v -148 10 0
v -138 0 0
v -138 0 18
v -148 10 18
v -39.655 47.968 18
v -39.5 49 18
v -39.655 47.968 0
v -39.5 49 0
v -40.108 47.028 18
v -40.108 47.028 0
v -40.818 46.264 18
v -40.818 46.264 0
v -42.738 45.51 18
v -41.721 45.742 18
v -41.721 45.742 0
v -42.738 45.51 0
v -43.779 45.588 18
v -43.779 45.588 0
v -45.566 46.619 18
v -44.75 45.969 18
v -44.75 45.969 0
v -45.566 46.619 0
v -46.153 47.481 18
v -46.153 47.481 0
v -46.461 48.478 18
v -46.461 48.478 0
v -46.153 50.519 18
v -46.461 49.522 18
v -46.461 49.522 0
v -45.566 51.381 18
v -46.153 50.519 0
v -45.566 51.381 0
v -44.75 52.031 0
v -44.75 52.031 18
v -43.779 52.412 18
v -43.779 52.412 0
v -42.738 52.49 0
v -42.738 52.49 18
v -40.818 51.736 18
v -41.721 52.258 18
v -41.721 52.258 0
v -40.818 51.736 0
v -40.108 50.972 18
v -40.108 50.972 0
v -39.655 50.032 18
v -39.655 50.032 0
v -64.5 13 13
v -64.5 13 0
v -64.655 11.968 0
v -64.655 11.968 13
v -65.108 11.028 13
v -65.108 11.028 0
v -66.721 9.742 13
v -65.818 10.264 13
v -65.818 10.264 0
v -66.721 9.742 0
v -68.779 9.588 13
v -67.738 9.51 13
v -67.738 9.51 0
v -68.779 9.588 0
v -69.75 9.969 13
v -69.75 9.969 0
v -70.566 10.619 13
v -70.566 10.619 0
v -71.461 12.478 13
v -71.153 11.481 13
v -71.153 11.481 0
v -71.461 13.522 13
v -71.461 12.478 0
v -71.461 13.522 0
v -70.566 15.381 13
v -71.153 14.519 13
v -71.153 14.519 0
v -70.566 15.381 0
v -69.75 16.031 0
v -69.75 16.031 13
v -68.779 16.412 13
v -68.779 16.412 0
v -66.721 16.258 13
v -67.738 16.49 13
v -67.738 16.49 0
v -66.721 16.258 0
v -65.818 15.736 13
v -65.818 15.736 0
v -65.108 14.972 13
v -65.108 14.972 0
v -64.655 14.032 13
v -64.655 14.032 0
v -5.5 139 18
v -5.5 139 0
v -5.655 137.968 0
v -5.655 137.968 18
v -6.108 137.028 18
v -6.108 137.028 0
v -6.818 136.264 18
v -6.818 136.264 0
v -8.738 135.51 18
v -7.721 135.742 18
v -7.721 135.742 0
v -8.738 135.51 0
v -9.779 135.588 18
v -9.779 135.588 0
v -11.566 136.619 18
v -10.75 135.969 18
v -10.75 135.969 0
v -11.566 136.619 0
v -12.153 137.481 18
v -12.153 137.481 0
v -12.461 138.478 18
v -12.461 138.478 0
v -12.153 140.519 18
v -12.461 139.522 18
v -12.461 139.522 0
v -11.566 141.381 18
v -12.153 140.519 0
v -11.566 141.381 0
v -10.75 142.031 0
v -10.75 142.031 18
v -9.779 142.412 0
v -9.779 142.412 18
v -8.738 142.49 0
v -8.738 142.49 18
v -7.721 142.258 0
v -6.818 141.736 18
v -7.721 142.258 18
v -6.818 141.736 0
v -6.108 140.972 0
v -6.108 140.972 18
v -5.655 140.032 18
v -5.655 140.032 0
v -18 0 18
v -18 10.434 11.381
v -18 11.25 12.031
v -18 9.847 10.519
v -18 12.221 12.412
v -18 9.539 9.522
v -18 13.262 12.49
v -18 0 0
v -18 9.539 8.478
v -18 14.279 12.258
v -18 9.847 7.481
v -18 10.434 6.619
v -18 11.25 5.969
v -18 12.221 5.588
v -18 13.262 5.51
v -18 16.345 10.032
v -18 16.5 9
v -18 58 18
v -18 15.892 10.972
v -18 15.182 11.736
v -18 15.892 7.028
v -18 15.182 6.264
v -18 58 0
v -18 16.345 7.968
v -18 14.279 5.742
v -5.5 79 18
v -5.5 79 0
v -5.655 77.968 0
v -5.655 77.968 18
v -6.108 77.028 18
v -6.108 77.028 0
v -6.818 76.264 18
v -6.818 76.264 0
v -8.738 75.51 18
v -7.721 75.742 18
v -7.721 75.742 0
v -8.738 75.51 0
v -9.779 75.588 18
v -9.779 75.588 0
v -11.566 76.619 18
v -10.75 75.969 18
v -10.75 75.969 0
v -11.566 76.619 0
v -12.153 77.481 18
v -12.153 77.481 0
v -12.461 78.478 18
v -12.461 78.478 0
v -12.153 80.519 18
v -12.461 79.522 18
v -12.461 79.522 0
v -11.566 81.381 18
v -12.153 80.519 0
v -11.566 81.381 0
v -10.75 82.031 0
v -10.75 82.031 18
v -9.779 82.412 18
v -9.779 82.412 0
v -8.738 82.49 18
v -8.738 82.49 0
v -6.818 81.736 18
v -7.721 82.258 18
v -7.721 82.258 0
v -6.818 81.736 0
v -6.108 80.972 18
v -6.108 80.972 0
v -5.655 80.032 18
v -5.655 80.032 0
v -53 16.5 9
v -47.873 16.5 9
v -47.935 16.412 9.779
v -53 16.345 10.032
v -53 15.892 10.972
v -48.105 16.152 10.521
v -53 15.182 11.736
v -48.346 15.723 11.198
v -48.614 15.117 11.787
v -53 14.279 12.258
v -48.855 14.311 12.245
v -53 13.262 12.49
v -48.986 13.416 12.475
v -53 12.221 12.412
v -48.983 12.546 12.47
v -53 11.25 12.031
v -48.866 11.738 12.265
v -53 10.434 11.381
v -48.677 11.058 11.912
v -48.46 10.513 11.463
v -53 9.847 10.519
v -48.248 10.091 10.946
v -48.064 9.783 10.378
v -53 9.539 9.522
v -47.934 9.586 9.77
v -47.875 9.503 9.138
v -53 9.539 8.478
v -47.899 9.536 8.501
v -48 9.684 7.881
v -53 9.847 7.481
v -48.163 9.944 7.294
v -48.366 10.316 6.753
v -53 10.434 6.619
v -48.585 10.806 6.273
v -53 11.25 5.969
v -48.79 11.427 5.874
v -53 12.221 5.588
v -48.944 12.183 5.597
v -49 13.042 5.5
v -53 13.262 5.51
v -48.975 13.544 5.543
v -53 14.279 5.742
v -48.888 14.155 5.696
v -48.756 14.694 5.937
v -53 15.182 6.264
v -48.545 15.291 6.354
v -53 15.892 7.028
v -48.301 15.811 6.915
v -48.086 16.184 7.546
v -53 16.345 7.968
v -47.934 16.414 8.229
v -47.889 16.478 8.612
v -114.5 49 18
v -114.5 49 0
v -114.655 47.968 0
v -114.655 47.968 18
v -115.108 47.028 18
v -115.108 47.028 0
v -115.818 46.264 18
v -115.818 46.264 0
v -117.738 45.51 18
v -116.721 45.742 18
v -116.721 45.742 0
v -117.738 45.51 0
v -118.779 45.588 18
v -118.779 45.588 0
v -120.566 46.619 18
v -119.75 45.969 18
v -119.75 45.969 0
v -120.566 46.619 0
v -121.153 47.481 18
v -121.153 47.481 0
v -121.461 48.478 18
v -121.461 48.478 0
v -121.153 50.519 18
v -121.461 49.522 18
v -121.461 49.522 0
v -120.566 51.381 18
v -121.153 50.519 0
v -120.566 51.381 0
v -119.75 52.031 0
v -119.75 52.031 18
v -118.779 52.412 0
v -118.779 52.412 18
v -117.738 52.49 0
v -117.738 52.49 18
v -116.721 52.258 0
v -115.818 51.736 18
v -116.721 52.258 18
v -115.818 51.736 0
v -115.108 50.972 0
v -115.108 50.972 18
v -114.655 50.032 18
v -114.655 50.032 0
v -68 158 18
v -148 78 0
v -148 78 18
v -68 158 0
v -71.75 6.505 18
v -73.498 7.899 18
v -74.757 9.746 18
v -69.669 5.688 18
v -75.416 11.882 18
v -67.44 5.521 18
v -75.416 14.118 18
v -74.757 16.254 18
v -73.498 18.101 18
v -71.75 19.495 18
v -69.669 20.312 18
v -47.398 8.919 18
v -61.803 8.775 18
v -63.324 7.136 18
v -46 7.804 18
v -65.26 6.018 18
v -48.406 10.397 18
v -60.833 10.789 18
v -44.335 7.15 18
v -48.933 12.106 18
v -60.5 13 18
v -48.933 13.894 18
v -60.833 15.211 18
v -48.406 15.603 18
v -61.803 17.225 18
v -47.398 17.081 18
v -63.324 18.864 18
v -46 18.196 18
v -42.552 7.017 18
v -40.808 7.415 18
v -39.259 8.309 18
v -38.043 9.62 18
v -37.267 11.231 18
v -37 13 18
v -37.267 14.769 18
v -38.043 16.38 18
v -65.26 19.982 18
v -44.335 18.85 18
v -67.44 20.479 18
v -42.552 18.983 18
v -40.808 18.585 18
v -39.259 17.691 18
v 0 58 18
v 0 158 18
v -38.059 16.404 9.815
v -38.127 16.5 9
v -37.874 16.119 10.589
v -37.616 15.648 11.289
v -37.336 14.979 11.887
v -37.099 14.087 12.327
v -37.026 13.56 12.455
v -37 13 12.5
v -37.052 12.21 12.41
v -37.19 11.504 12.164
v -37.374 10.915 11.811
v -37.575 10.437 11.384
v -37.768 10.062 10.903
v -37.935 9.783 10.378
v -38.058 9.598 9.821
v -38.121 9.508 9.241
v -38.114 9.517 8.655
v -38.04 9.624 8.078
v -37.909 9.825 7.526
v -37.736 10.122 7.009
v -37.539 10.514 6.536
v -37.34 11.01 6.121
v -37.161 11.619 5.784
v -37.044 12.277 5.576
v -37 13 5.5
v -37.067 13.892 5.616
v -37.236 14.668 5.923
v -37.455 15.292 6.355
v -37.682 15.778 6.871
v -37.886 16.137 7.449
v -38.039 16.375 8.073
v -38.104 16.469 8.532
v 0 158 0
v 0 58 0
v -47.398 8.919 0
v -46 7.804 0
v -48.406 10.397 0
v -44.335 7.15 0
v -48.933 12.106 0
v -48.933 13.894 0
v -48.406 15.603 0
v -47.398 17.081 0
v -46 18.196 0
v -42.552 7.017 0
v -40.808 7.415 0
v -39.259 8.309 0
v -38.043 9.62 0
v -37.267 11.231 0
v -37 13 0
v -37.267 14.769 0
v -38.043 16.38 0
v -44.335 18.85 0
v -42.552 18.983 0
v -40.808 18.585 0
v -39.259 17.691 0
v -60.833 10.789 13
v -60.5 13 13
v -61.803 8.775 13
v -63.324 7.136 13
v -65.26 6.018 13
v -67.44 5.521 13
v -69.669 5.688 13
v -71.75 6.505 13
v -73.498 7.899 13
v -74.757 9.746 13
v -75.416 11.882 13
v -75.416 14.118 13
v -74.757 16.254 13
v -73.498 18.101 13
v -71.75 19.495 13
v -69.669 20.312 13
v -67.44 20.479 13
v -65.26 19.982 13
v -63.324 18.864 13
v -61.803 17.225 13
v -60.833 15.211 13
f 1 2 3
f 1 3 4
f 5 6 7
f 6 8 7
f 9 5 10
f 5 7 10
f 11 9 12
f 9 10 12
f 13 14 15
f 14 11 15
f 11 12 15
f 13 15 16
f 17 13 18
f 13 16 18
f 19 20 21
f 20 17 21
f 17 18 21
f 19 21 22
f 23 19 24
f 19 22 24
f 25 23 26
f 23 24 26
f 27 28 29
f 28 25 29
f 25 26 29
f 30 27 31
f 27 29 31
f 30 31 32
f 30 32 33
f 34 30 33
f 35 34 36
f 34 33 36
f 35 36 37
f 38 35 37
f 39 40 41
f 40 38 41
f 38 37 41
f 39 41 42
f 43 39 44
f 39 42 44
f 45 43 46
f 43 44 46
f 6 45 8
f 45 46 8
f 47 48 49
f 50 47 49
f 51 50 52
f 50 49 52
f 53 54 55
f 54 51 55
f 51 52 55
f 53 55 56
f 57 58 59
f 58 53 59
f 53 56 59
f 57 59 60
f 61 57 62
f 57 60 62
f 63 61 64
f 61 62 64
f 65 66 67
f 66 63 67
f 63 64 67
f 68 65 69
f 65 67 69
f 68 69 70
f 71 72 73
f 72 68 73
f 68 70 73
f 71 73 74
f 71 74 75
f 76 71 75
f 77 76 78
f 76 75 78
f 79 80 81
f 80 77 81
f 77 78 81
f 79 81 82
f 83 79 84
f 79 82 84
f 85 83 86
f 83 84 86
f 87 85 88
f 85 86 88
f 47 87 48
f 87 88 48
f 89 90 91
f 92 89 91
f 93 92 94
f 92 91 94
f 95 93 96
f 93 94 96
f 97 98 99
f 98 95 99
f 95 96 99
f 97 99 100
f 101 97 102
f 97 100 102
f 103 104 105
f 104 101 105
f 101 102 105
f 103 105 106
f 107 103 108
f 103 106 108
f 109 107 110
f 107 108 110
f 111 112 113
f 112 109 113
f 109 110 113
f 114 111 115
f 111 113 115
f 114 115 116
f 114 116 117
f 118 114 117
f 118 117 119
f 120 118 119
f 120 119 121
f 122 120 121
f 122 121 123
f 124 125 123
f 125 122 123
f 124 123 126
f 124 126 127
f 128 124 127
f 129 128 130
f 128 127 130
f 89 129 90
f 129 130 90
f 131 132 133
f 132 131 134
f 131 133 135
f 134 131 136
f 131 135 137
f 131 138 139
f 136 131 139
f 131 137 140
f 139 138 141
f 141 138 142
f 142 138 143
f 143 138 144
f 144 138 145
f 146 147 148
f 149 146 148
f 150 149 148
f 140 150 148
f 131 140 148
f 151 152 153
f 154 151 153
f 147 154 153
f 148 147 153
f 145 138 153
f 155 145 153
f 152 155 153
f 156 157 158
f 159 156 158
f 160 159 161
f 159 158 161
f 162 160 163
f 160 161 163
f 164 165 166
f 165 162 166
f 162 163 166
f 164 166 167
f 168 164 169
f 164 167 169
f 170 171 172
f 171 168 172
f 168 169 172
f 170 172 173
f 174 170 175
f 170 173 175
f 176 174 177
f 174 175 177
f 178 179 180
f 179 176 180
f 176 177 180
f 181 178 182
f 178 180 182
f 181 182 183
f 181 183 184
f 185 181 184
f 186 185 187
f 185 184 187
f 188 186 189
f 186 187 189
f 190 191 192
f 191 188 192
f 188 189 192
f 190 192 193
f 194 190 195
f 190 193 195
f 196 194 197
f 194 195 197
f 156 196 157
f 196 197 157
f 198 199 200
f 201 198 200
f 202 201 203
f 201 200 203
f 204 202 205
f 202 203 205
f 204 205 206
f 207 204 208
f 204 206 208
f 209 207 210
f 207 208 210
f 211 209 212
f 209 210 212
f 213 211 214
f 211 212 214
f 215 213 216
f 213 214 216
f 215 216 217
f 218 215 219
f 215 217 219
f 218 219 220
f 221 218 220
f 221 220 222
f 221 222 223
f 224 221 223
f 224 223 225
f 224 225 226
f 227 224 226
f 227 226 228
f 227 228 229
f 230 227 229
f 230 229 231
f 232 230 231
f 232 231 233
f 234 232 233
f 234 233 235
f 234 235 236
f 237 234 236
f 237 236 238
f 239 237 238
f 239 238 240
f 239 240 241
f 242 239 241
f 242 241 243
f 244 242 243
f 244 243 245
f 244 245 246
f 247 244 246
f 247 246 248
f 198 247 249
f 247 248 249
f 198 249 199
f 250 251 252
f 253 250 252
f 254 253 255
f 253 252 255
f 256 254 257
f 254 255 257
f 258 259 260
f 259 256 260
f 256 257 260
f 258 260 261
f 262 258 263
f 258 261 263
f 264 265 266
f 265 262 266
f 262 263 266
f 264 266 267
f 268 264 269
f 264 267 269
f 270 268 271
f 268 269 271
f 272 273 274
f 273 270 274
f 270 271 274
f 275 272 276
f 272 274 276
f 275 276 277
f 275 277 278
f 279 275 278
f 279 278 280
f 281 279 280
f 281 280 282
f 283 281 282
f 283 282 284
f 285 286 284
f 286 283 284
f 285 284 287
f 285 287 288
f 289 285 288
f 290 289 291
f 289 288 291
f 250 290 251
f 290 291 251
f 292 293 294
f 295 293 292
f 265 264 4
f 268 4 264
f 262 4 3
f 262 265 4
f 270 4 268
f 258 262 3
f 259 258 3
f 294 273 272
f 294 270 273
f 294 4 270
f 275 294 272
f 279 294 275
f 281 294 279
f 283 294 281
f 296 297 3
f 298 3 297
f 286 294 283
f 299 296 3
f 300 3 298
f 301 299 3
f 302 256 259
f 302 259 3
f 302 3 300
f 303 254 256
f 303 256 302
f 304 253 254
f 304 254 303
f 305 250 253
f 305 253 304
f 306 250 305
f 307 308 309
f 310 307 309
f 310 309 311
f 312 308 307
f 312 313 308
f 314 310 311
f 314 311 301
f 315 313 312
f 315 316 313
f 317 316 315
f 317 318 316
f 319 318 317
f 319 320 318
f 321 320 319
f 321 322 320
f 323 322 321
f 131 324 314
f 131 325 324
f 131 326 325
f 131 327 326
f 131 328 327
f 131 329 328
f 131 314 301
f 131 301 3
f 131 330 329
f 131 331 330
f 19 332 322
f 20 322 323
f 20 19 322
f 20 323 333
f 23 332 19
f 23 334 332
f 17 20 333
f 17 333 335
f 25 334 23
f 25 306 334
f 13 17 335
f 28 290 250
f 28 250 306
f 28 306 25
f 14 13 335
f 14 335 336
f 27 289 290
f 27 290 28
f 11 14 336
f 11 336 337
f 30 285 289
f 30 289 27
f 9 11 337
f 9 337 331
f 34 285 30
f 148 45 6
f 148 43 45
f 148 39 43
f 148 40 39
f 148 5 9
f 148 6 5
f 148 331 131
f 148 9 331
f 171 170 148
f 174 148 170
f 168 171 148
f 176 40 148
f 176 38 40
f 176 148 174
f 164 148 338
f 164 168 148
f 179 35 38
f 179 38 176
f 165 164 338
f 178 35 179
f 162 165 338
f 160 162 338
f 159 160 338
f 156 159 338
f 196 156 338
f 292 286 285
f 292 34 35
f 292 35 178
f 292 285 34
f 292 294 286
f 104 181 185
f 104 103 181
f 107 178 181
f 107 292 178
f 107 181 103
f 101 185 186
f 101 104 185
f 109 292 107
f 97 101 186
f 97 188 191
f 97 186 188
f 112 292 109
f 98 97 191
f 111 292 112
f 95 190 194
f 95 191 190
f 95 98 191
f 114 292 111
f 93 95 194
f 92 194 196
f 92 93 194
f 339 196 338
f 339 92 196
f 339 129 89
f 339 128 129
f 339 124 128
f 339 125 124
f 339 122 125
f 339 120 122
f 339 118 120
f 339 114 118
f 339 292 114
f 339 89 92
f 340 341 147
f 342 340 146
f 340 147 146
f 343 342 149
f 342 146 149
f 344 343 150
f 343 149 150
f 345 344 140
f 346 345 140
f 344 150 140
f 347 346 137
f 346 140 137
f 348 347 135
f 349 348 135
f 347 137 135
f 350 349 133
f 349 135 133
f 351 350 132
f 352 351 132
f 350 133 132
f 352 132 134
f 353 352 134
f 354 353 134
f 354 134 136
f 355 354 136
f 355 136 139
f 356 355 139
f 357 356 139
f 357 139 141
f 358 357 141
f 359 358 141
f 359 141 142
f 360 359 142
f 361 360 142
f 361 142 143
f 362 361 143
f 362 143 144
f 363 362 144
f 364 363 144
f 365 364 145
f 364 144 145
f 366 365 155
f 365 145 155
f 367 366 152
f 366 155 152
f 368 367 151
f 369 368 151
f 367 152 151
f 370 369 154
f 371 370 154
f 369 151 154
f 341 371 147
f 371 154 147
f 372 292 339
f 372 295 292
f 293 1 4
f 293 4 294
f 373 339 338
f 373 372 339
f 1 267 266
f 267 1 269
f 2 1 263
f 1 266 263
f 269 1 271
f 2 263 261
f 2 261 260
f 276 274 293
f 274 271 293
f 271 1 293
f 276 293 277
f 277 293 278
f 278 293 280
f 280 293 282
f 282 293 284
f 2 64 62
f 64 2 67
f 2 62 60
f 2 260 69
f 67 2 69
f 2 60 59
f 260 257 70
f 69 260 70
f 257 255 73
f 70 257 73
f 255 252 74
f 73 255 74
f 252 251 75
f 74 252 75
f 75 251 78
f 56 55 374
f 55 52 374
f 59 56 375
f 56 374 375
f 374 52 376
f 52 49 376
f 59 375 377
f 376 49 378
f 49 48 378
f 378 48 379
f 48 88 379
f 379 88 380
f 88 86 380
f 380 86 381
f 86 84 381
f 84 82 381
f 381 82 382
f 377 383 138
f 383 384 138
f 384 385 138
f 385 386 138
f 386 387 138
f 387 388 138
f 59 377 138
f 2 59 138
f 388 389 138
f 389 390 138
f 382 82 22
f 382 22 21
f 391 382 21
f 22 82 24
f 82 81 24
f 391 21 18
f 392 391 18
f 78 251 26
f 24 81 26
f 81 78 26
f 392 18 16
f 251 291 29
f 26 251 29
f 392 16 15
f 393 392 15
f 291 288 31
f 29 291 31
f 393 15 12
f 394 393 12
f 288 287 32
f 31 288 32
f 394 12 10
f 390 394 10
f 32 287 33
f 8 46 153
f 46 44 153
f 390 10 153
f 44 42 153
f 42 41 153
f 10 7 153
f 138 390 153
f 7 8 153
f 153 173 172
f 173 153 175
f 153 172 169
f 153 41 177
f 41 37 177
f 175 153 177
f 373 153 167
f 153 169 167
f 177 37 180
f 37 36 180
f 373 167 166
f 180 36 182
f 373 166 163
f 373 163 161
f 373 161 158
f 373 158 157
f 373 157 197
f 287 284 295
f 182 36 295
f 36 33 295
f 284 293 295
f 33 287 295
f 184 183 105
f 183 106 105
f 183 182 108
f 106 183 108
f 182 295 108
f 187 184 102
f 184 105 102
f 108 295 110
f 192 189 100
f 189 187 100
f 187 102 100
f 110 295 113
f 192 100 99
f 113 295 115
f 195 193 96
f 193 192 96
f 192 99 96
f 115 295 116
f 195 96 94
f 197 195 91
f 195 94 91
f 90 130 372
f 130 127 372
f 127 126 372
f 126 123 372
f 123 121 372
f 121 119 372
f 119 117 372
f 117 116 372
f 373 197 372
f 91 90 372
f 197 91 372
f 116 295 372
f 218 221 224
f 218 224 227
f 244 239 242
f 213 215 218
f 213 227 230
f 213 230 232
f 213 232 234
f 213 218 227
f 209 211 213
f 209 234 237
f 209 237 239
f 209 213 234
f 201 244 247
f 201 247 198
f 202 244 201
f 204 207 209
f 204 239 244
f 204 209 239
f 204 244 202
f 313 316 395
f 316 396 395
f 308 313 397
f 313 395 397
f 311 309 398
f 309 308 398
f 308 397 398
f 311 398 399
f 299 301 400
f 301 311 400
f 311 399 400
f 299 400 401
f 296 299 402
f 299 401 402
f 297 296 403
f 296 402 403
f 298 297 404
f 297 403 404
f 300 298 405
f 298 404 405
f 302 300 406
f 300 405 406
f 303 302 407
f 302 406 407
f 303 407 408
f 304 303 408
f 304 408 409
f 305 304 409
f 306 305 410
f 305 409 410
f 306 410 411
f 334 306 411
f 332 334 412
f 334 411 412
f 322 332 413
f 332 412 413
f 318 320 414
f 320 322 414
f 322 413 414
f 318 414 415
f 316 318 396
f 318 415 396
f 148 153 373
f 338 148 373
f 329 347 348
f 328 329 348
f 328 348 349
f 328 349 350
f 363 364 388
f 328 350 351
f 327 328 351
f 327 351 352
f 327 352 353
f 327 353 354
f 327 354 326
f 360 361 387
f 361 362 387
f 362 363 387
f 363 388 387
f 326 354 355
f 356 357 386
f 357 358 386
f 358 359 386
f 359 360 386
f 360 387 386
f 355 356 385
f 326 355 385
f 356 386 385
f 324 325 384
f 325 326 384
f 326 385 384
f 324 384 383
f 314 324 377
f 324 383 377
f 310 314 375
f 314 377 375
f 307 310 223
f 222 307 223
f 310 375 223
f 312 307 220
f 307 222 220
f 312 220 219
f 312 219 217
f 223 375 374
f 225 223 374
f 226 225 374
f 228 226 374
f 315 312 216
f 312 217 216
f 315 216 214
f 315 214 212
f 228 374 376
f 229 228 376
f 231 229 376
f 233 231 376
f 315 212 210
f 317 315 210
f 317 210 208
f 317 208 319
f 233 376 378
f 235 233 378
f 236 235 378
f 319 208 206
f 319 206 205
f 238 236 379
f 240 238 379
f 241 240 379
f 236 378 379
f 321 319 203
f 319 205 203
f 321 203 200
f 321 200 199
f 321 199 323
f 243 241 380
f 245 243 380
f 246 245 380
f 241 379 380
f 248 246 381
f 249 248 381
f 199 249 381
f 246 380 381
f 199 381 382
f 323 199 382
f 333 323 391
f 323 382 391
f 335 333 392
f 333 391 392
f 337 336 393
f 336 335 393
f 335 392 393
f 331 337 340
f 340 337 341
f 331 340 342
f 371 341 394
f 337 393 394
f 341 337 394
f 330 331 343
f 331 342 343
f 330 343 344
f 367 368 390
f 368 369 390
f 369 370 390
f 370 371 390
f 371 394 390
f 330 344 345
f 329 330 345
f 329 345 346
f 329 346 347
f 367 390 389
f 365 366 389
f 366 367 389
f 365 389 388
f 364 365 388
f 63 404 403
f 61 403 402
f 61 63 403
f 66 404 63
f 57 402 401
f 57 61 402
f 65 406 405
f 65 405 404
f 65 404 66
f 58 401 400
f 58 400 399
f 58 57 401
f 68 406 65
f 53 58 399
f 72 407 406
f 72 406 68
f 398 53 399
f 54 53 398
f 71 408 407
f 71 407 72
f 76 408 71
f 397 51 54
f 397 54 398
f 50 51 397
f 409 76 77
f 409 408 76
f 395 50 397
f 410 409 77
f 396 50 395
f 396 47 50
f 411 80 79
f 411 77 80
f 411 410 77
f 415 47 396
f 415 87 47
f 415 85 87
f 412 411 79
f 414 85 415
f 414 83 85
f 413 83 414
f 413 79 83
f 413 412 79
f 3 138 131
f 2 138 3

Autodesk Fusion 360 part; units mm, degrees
sketch "Top" plane through (0, 0, 0) normal (0, 0, 1) x (1, 0, 0)
  line L0 (-18, 0) -> (-138, 0)
  line L1 (-148, 10) -> (-148, 78)
  line L2 (-68, 158) -> (0, 158)
  line L3 (0, 158) -> (0, 58)
  line L4 (-138, 0) -> (-148, 10)
  line L5 (-18, 0) -> (-18, 58)
  line L6 (-18, 58) -> (0, 58)
  line L7 (-9, 158) -> (-9, 58) construction
  circle A0 centre (-9, 79) radius 3.5
  circle A1 centre (-9, 139) radius 3.5
  line L8 (-18, 49) -> (-148, 49) construction
  circle A2 centre (-43, 49) radius 3.5
  circle A3 centre (-118, 49) radius 3.5
  circle A4 centre (-43, 13) radius 6
  circle A5 centre (-68, 13) radius 3.5
  circle A6 centre (-68, 13) radius 7.5
  line L9 (-148, 78) -> (-68, 158)
  dimension "d4" = 158
  dimension "d5" = 10
  dimension "d6" = 10
  dimension "d7" = 58
  dimension "d8" = 18
  dimension "d9" = 148
  dimension "d11" = 9
  dimension "d12" = 7
  dimension "d13" = 7
  dimension "d14" = 21
  dimension "d15" = 60
  dimension "d16" = 49
  dimension "d17" = 7
  dimension "d18" = 7
  dimension "d19" = 25
  dimension "d20" = 75
  dimension "d21" = 12
  dimension "d22" = 13
  dimension "d23" = 7
  dimension "d24" = 15
  dimension "d25" = 25
  dimension "d26" = 25
  dimension "d27" = 68
  dimension "d28" = 68
extrude "Extrude1" add sketch "Top" along normal blind 13 contours A6
extrude "Extrude2" add sketch "Top" along normal blind 18 contours L0 L1 L2 L3 L4 L5 L6 L9
sketch "Side" plane through (-18, 0, 0) normal (1, 0, 0) x (0, 1, 0)
  line L0 (0, 0) -> (58, 0)
  line L1 (58, 0) -> (58, 18)
  line L2 (58, 18) -> (0, 18)
  line L3 (0, 18) -> (0, 0)
  line L4 (0, 0) -> (58, 0) construction
  line L5 (58, 0) -> (58, 18) construction
  line L6 (58, 18) -> (0, 18) construction
  line L7 (0, 18) -> (0, 0) construction
  line L8 (0, 9) -> (58, 9) construction
  circle A0 centre (13, 9) radius 3.5
  dimension "d33" = 7
  dimension "d34" = 13
extrude "Extrude3" cut sketch "Side" against normal blind 35 contours A0
